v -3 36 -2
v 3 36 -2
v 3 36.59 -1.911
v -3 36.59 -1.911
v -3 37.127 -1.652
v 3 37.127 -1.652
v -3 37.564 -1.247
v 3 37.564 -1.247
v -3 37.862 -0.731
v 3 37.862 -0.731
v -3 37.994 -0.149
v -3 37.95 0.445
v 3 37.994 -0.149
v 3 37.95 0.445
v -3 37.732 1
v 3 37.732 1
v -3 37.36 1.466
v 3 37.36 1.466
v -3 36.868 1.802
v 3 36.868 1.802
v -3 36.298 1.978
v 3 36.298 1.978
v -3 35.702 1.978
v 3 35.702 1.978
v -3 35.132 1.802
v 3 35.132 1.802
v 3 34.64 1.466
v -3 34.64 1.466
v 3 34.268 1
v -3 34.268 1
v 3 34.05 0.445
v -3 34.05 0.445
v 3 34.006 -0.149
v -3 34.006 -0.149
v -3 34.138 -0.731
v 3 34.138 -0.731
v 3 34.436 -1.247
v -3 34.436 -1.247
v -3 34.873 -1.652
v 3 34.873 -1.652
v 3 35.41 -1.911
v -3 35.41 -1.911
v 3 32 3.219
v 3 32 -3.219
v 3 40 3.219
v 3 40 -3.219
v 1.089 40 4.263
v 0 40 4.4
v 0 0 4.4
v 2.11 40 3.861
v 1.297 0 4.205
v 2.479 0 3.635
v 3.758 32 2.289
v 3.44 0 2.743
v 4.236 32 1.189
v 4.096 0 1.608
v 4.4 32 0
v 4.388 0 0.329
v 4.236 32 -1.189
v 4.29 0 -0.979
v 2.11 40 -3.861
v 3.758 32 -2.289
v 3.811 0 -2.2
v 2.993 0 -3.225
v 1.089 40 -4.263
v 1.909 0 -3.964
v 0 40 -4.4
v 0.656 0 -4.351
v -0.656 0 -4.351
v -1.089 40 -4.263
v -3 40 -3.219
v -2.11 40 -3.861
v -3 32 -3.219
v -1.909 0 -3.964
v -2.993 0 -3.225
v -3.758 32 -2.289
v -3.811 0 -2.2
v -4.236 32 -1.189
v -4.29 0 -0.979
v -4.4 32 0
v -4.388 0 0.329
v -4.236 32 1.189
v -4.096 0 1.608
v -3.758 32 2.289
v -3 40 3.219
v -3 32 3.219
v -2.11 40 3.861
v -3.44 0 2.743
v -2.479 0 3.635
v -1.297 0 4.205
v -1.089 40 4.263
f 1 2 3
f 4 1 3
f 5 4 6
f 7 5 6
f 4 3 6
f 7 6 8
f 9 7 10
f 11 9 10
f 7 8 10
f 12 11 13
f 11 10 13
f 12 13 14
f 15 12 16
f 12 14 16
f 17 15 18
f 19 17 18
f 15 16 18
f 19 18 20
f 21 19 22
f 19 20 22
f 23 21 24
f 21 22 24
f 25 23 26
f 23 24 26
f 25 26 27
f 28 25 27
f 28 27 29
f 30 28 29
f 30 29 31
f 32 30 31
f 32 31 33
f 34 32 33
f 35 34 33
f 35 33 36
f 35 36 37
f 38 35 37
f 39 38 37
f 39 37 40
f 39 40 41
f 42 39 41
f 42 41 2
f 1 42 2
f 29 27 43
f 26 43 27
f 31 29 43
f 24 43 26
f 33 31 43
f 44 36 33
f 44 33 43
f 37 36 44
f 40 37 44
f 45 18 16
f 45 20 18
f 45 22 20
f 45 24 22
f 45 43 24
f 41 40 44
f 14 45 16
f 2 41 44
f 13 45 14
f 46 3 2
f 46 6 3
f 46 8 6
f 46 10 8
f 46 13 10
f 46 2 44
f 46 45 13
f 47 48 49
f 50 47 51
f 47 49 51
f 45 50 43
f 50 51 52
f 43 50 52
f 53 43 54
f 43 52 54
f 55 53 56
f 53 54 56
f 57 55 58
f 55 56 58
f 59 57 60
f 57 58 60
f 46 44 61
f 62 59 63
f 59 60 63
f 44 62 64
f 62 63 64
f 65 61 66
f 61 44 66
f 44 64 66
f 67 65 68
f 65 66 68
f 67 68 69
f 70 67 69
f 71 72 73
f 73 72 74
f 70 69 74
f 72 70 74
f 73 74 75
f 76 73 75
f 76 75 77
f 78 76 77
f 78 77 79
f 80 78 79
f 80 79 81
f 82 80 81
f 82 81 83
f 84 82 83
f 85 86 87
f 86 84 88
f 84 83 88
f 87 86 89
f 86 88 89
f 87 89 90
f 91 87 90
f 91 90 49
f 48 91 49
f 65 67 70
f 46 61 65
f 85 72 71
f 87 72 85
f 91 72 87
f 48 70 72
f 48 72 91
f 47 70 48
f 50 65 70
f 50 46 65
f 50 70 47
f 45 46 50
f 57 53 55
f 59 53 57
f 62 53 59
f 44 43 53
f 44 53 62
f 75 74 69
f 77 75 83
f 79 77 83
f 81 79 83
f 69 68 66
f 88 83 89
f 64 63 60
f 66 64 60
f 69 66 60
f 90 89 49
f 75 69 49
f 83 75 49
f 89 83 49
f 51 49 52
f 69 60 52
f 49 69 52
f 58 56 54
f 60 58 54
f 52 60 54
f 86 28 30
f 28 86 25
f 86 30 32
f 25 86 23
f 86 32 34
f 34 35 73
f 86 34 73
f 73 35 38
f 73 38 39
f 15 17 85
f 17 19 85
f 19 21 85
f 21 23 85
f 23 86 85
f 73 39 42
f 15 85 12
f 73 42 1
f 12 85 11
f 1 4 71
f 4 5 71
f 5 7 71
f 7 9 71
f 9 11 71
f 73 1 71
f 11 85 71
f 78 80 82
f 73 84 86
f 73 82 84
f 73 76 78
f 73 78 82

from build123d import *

# Parameters (mm, degrees)
SKETCH1_R           = 4.4
BOSS_EXTRUDE1_DEPTH = 40
SKETCH2_W           = 2.8
SKETCH2_H           = 6.437390776
CUT_EXTRUDE1_DEPTH  = 8
SKETCH3_R           = 2
CUT_EXTRUDE2_DEPTH  = 41.916011536


with BuildPart() as part:
    # Sketch1 → Boss-Extrude1 (new body)
    with BuildSketch(Plane(origin=(0, 0, 0), x_dir=(1, 0, 0), z_dir=(0, 1, 0))):
        with Locations(Location((0, 0, 0), (0, 0, 270))):
            Circle(SKETCH1_R)
    extrude(amount=BOSS_EXTRUDE1_DEPTH)

    # Sketch2 → Cut-Extrude1 (cut)
    with BuildSketch(Plane(origin=(0, 40, 0), x_dir=(1, 0, 0), z_dir=(0, 1, 0))):
        with Locations((-4.4, 0)):
            Rectangle(SKETCH2_W, SKETCH2_H)
        with Locations((4.4, 0)):
            Rectangle(SKETCH2_W, SKETCH2_H)
    extrude(amount=-CUT_EXTRUDE1_DEPTH, mode=Mode.SUBTRACT)

    # Sketch3 → Cut-Extrude2 (cut, through all)
    with BuildSketch(Plane(origin=(3, 0, 0), x_dir=(0, 0, -1), z_dir=(1, 0, 0))):
        with Locations((0, 36)):
            Circle(SKETCH3_R)
    extrude(amount=-CUT_EXTRUDE2_DEPTH, mode=Mode.SUBTRACT)


solid = part.part
